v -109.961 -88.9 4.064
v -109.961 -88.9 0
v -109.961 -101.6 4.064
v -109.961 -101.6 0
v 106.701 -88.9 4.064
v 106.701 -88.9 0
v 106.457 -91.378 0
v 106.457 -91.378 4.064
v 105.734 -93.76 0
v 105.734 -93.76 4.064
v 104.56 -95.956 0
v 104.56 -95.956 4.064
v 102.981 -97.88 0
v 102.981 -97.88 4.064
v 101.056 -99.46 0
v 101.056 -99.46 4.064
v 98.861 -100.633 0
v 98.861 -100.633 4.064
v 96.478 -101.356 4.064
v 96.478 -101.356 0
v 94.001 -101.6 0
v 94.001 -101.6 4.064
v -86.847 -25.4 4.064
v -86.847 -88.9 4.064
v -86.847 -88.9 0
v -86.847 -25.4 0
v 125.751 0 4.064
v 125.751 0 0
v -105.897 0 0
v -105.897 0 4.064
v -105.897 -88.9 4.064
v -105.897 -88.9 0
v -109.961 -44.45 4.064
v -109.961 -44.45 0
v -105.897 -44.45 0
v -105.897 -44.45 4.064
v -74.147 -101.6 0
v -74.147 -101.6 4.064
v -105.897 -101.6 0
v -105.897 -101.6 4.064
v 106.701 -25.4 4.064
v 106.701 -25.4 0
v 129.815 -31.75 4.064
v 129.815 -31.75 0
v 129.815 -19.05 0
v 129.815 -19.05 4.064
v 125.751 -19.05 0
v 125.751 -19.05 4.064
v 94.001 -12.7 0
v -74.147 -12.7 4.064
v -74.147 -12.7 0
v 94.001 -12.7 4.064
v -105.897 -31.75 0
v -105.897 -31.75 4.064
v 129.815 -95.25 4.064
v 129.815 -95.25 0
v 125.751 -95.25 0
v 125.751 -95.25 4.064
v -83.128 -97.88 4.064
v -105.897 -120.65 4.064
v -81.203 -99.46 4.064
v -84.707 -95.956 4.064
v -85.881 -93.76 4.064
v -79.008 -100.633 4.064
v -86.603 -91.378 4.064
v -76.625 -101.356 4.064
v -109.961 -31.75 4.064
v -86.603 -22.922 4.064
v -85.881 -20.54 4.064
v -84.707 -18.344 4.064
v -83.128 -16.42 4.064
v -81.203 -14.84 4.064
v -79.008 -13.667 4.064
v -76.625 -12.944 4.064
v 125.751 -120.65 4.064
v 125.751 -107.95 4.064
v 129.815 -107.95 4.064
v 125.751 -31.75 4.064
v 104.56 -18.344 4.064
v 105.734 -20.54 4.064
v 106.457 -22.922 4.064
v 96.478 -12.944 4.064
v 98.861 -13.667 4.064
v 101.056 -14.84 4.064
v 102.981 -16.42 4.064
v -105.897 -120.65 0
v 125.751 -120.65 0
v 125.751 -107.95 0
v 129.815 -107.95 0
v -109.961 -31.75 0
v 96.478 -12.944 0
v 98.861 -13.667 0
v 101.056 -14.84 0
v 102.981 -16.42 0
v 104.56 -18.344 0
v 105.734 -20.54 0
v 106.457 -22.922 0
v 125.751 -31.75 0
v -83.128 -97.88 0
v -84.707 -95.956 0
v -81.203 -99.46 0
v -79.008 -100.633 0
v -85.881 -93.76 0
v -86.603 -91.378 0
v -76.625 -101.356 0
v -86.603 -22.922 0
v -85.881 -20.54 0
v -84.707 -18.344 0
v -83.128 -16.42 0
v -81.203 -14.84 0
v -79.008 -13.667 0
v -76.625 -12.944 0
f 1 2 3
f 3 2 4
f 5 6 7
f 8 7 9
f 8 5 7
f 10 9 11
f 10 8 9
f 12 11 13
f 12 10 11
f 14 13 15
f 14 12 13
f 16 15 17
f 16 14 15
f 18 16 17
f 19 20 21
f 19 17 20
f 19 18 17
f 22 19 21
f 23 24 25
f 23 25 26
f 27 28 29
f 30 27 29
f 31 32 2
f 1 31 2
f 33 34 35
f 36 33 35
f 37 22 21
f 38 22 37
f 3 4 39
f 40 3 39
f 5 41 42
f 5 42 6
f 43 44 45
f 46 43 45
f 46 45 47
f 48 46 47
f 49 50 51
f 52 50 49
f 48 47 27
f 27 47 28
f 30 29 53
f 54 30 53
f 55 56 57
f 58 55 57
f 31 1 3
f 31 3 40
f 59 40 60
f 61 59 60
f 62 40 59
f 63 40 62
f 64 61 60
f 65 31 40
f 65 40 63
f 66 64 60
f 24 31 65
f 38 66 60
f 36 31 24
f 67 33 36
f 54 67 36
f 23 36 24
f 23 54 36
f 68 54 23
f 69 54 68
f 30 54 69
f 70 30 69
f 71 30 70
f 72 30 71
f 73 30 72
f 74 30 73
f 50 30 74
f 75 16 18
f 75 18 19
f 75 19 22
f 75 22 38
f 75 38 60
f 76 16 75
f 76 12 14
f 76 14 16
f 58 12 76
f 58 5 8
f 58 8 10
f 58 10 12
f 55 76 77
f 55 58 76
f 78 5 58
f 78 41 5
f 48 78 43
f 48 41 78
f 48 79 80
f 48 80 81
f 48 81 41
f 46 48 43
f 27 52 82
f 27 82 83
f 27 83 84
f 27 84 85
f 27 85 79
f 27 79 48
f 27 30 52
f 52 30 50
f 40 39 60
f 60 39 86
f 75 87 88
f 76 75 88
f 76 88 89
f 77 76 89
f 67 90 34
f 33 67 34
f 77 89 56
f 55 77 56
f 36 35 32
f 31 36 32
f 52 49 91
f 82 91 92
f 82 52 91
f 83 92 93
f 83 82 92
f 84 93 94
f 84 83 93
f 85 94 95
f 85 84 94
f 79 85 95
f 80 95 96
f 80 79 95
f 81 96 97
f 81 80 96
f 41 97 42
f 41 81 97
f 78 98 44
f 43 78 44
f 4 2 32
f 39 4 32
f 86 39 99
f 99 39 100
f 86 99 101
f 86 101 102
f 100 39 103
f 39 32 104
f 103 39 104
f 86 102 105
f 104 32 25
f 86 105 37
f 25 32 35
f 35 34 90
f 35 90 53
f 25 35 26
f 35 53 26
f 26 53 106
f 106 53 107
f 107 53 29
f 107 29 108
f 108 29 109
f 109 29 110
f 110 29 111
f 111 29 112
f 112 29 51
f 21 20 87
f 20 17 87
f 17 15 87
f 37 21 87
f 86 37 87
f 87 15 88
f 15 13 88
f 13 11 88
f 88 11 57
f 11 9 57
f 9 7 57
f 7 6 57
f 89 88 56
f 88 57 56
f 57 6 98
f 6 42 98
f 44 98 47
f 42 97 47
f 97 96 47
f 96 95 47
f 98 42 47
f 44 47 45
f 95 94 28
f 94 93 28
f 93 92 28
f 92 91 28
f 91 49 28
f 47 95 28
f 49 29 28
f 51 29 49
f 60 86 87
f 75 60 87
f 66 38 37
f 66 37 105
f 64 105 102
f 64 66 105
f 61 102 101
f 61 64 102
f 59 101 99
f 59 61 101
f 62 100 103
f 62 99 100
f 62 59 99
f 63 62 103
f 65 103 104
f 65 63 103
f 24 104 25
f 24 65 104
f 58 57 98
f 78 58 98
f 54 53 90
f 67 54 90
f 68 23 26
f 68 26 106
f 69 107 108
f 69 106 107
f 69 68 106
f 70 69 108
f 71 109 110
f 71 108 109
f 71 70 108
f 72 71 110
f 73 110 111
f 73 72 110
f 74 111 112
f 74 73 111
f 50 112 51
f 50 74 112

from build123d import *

# Parameters (mm, degrees)
BOSS_EXTRUDE1_DEPTH = 4.064
CUT_EXTRUDE1_DEPTH  = 5.064


with BuildPart() as part:
    # Sketch1 → Boss-Extrude1 (new body)
    with BuildSketch(Plane.XY):
        Polygon((125.750548905, 0), (-105.897451095, 0), (-105.897451095, -31.75), (-109.961451095, -31.75), (-109.961451095, -44.45), (-105.897451095, -44.45), (-105.897451095, -88.9), (-109.961451095, -88.9), (-109.961451095, -101.6), (-105.897451095, -101.6), (-105.897451095, -120.65), (125.750548905, -120.65), (125.750548905, -107.95), (129.814548905, -107.95), (129.814548905, -95.25), (125.750548905, -95.25), (125.750548905, -31.75), (129.814548905, -31.75), (129.814548905, -19.05), (125.750548905, -19.05), align=None)
    extrude(amount=BOSS_EXTRUDE1_DEPTH)

    # Sketch2 → Cut-Extrude1 (cut, through all)
    with BuildSketch(Plane.XY.offset(4.064)):
        with BuildLine():
            Line((-74.147451095, -12.7), (94.000548905, -12.7))
            ThreePointArc((94.000548905, -12.7), (102.980805026, -16.419743879), (106.700548905, -25.4))
            Line((106.700548905, -25.4), (106.700548905, -88.9))
            ThreePointArc((106.700548905, -88.9), (102.980805026, -97.880256121), (94.000548905, -101.6))
            Line((94.000548905, -101.6), (-74.147451095, -101.6))
            ThreePointArc((-74.147451095, -101.6), (-83.127707216, -97.880256121), (-86.847451095, -88.9))
            Line((-86.847451095, -88.9), (-86.847451095, -25.4))
            ThreePointArc((-86.847451095, -25.4), (-83.127707216, -16.419743879), (-74.147451095, -12.7))
        make_face()
    extrude(amount=-CUT_EXTRUDE1_DEPTH, mode=Mode.SUBTRACT)


solid = part.part
